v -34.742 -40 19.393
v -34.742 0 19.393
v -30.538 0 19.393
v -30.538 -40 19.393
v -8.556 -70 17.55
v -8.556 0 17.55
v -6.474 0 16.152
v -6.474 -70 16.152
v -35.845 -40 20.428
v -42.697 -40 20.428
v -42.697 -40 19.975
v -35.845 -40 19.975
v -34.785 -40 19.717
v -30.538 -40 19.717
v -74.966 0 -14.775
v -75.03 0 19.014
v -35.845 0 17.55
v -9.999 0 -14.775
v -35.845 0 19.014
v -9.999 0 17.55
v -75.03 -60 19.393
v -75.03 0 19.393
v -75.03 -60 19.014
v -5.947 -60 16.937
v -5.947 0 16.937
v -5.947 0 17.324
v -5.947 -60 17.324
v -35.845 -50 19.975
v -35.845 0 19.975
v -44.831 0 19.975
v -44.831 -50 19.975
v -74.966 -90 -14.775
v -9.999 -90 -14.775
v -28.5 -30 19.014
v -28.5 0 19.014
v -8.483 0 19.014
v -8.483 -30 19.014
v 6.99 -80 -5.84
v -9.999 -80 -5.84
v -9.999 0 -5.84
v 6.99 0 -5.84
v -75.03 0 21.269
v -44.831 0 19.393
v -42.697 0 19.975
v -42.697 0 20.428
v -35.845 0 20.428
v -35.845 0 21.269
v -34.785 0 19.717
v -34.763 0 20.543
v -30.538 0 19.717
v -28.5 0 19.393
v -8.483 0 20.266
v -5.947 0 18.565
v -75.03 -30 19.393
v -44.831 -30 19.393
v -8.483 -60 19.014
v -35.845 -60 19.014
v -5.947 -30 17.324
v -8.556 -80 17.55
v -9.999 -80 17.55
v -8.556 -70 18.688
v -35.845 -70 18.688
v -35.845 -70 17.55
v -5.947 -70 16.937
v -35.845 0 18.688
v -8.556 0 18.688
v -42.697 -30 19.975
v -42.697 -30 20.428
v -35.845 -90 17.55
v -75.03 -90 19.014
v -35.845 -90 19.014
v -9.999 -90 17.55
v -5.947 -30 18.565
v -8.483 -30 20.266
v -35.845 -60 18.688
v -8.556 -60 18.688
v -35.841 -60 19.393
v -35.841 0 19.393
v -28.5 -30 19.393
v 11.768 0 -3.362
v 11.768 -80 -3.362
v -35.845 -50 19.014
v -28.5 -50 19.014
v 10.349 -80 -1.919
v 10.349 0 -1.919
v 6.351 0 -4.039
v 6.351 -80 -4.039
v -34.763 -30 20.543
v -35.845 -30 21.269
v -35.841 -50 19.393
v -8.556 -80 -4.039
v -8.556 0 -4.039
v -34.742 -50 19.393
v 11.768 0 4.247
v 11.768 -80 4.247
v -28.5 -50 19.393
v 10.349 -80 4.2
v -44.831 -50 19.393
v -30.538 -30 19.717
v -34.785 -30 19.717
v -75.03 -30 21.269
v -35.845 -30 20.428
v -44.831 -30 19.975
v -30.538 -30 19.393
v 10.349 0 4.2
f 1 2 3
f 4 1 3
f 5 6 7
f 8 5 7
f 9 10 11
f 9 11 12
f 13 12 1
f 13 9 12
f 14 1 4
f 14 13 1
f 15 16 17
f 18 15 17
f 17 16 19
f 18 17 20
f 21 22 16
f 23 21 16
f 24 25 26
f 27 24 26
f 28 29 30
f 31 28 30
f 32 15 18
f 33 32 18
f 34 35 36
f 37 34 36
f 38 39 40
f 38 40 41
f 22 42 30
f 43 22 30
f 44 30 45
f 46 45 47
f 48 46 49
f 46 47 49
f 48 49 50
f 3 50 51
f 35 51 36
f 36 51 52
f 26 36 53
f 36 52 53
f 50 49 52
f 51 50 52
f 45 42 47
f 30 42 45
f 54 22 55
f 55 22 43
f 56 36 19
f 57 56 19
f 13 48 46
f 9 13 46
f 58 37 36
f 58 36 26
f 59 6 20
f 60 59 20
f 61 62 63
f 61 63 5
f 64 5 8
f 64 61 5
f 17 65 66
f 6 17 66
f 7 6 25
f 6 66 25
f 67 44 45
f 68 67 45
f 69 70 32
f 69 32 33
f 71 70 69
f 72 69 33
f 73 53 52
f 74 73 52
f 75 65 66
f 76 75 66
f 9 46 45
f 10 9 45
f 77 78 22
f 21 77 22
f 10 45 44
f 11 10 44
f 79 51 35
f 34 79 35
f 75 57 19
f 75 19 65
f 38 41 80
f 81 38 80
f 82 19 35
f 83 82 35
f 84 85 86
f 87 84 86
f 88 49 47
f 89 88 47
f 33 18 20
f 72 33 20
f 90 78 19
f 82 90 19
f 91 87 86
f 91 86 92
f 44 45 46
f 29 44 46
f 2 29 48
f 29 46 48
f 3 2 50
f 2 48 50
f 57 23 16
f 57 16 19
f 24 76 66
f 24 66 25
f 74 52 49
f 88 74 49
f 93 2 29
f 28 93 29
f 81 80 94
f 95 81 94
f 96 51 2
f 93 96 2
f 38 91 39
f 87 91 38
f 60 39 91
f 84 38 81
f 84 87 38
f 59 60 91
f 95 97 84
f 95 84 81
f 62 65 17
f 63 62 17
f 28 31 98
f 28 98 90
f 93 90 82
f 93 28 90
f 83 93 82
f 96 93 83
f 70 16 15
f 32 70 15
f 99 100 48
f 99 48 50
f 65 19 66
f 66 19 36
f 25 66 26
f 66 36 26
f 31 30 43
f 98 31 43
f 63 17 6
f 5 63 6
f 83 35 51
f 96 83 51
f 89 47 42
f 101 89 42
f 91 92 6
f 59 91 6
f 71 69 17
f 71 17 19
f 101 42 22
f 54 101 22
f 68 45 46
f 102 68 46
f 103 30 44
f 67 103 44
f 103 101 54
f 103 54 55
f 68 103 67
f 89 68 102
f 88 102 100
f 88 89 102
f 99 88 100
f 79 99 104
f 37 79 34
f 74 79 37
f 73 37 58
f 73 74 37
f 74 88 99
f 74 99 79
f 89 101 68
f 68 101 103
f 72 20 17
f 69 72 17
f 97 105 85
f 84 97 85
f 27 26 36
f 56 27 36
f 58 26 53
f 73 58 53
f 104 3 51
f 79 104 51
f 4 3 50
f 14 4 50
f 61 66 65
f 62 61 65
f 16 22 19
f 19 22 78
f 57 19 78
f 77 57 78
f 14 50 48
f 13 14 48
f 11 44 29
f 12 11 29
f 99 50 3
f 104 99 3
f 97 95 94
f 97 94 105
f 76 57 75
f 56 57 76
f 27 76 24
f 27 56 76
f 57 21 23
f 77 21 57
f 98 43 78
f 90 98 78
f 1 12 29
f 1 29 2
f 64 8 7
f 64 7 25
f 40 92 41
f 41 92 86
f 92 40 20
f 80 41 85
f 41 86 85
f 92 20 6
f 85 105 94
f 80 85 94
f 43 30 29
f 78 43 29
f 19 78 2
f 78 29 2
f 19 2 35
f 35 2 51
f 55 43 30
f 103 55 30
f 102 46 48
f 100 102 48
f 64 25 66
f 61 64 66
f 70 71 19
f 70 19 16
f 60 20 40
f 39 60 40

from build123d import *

# Parameters (mm, degrees)
F1_DEPTH = 90
F2_DEPTH = 80
F3_DEPTH = 70
F4_DEPTH = 60
F5_DEPTH = 60
F6_DEPTH = 50
F7_DEPTH = 40
F8_DEPTH = 30


# Not quite as in the source:
# - a feature names something its author has since deleted; it is built from what else it names


with BuildPart() as f1:
    # F0 (on Front) → F1 (new body)
    with BuildSketch(Plane.XZ):
        Polygon((-35.844899714, 19.0136060119), (-75.0298798084, 19.0136060119), (-74.9661251903, -14.775316231), (-9.9985962734, -14.775316231), (-9.9985962734, -5.8398880064), (-9.9985962734, 16.2808988243), (-9.9985962734, 17.5495628755), (-35.844899714, 17.5495628755), (-35.844899714, 18.6878981805), align=None)
    extrude(amount=F1_DEPTH)


with BuildPart() as f2:
    # F0 (on Front) → F2 (new body)
    with BuildSketch(Plane.XZ):
        Polygon((-9.9985962734, 16.2808988243), (-9.9985962734, -5.8398880064), (6.9901682436, -5.8398880064), (11.7682581767, -3.3623597119), (11.7682581767, 4.2471913621), (10.3489141911, 4.1997791268), (10.3489141911, -1.9189424347), (6.350541953, -4.0392908268), (-8.5561517044, -4.0392908268), (-8.5561517044, 17.5495628755), (-9.9985962734, 17.5495628755), align=None)
    extrude(amount=F2_DEPTH)


with BuildPart() as f3:
    # F0 (on Front) → F3 (new body)
    with BuildSketch(Plane.XZ):
        Polygon((-8.5561517044, 18.6878981805), (-35.844899714, 18.6878981805), (-35.844899714, 17.5495628755), (-9.9985962734, 17.5495628755), (-8.5561517044, 17.5495628755), (-6.4736446366, 16.1520168185), (-5.9469314412, 16.9368810786), align=None)
    extrude(amount=F3_DEPTH)


with BuildPart() as f4:
    # F0 (on Front) → F4 (new body)
    with BuildSketch(Plane.XZ):
        Polygon((-75.0298798084, 19.3932503462), (-75.0298798084, 19.0136060119), (-35.844899714, 19.0136060119), (-35.8411632478, 19.3932503462), (-44.8312833905, 19.3932503462), align=None)
    extrude(amount=F4_DEPTH)


with BuildPart() as f5:
    # F0 (on Front) → F5 (new body)
    with BuildSketch(Plane.XZ):
        Polygon((-28.500309214, 19.0136060119), (-35.844899714, 19.0136060119), (-35.844899714, 18.6878981805), (-8.5561517044, 18.6878981805), (-5.9469314412, 16.9368810786), (-5.9469314412, 17.3235815018), (-8.4827402607, 19.0136060119), align=None)
    extrude(amount=F5_DEPTH)


with BuildPart() as f6:
    # F0 (on Front) → F6 (new body)
    with BuildSketch(Plane.XZ):
        Polygon((-35.8411632478, 19.3932503462), (-35.844899714, 19.0136060119), (-28.500309214, 19.0136060119), (-28.500309214, 19.3932503462), (-30.5376388133, 19.3932503462), (-34.7416512668, 19.3932503462), (-35.844899714, 19.9753437191), (-42.6969379187, 19.9753437191), (-44.8312833905, 19.9753437191), (-44.8312833905, 19.3932503462), align=None)
    extrude(amount=F6_DEPTH)


with BuildPart() as f7:
    # F0 (on Front) → F7 (new body)
    with BuildSketch(Plane.XZ):
        Polygon((-34.7416512668, 19.3932503462), (-30.5376388133, 19.3932503462), (-30.5376388133, 19.7169722799), (-34.7852603294, 19.7169722799), (-35.844899714, 20.428083837), (-42.6969379187, 20.428083837), (-42.6969379187, 19.9753437191), (-35.844899714, 19.9753437191), align=None)
    extrude(amount=F7_DEPTH)


with BuildPart() as f8:
    # F0 (on Front) → F8 (new body)
    with BuildSketch(Plane.XZ):
        Polygon((-75.0298798084, 21.2688874453), (-75.0298798084, 19.3932503462), (-44.8312833905, 19.3932503462), (-44.8312833905, 19.9753437191), (-42.6969379187, 19.9753437191), (-42.6969379187, 20.428083837), (-35.844899714, 20.428083837), (-34.7852603294, 19.7169722799), (-30.5376388133, 19.7169722799), (-30.5376388133, 19.3932503462), (-28.500309214, 19.3932503462), (-28.500309214, 19.0136060119), (-8.4827402607, 19.0136060119), (-5.9469314412, 17.3235815018), (-5.9469314412, 18.5646397935), (-8.4827402607, 20.2663913369), (-34.7626654522, 20.5426127312), (-35.844899714, 21.2688874453), align=None)
    extrude(amount=F8_DEPTH)


solid = Compound([f1.part, f2.part, f3.part, f4.part, f5.part, f6.part, f7.part, f8.part])
